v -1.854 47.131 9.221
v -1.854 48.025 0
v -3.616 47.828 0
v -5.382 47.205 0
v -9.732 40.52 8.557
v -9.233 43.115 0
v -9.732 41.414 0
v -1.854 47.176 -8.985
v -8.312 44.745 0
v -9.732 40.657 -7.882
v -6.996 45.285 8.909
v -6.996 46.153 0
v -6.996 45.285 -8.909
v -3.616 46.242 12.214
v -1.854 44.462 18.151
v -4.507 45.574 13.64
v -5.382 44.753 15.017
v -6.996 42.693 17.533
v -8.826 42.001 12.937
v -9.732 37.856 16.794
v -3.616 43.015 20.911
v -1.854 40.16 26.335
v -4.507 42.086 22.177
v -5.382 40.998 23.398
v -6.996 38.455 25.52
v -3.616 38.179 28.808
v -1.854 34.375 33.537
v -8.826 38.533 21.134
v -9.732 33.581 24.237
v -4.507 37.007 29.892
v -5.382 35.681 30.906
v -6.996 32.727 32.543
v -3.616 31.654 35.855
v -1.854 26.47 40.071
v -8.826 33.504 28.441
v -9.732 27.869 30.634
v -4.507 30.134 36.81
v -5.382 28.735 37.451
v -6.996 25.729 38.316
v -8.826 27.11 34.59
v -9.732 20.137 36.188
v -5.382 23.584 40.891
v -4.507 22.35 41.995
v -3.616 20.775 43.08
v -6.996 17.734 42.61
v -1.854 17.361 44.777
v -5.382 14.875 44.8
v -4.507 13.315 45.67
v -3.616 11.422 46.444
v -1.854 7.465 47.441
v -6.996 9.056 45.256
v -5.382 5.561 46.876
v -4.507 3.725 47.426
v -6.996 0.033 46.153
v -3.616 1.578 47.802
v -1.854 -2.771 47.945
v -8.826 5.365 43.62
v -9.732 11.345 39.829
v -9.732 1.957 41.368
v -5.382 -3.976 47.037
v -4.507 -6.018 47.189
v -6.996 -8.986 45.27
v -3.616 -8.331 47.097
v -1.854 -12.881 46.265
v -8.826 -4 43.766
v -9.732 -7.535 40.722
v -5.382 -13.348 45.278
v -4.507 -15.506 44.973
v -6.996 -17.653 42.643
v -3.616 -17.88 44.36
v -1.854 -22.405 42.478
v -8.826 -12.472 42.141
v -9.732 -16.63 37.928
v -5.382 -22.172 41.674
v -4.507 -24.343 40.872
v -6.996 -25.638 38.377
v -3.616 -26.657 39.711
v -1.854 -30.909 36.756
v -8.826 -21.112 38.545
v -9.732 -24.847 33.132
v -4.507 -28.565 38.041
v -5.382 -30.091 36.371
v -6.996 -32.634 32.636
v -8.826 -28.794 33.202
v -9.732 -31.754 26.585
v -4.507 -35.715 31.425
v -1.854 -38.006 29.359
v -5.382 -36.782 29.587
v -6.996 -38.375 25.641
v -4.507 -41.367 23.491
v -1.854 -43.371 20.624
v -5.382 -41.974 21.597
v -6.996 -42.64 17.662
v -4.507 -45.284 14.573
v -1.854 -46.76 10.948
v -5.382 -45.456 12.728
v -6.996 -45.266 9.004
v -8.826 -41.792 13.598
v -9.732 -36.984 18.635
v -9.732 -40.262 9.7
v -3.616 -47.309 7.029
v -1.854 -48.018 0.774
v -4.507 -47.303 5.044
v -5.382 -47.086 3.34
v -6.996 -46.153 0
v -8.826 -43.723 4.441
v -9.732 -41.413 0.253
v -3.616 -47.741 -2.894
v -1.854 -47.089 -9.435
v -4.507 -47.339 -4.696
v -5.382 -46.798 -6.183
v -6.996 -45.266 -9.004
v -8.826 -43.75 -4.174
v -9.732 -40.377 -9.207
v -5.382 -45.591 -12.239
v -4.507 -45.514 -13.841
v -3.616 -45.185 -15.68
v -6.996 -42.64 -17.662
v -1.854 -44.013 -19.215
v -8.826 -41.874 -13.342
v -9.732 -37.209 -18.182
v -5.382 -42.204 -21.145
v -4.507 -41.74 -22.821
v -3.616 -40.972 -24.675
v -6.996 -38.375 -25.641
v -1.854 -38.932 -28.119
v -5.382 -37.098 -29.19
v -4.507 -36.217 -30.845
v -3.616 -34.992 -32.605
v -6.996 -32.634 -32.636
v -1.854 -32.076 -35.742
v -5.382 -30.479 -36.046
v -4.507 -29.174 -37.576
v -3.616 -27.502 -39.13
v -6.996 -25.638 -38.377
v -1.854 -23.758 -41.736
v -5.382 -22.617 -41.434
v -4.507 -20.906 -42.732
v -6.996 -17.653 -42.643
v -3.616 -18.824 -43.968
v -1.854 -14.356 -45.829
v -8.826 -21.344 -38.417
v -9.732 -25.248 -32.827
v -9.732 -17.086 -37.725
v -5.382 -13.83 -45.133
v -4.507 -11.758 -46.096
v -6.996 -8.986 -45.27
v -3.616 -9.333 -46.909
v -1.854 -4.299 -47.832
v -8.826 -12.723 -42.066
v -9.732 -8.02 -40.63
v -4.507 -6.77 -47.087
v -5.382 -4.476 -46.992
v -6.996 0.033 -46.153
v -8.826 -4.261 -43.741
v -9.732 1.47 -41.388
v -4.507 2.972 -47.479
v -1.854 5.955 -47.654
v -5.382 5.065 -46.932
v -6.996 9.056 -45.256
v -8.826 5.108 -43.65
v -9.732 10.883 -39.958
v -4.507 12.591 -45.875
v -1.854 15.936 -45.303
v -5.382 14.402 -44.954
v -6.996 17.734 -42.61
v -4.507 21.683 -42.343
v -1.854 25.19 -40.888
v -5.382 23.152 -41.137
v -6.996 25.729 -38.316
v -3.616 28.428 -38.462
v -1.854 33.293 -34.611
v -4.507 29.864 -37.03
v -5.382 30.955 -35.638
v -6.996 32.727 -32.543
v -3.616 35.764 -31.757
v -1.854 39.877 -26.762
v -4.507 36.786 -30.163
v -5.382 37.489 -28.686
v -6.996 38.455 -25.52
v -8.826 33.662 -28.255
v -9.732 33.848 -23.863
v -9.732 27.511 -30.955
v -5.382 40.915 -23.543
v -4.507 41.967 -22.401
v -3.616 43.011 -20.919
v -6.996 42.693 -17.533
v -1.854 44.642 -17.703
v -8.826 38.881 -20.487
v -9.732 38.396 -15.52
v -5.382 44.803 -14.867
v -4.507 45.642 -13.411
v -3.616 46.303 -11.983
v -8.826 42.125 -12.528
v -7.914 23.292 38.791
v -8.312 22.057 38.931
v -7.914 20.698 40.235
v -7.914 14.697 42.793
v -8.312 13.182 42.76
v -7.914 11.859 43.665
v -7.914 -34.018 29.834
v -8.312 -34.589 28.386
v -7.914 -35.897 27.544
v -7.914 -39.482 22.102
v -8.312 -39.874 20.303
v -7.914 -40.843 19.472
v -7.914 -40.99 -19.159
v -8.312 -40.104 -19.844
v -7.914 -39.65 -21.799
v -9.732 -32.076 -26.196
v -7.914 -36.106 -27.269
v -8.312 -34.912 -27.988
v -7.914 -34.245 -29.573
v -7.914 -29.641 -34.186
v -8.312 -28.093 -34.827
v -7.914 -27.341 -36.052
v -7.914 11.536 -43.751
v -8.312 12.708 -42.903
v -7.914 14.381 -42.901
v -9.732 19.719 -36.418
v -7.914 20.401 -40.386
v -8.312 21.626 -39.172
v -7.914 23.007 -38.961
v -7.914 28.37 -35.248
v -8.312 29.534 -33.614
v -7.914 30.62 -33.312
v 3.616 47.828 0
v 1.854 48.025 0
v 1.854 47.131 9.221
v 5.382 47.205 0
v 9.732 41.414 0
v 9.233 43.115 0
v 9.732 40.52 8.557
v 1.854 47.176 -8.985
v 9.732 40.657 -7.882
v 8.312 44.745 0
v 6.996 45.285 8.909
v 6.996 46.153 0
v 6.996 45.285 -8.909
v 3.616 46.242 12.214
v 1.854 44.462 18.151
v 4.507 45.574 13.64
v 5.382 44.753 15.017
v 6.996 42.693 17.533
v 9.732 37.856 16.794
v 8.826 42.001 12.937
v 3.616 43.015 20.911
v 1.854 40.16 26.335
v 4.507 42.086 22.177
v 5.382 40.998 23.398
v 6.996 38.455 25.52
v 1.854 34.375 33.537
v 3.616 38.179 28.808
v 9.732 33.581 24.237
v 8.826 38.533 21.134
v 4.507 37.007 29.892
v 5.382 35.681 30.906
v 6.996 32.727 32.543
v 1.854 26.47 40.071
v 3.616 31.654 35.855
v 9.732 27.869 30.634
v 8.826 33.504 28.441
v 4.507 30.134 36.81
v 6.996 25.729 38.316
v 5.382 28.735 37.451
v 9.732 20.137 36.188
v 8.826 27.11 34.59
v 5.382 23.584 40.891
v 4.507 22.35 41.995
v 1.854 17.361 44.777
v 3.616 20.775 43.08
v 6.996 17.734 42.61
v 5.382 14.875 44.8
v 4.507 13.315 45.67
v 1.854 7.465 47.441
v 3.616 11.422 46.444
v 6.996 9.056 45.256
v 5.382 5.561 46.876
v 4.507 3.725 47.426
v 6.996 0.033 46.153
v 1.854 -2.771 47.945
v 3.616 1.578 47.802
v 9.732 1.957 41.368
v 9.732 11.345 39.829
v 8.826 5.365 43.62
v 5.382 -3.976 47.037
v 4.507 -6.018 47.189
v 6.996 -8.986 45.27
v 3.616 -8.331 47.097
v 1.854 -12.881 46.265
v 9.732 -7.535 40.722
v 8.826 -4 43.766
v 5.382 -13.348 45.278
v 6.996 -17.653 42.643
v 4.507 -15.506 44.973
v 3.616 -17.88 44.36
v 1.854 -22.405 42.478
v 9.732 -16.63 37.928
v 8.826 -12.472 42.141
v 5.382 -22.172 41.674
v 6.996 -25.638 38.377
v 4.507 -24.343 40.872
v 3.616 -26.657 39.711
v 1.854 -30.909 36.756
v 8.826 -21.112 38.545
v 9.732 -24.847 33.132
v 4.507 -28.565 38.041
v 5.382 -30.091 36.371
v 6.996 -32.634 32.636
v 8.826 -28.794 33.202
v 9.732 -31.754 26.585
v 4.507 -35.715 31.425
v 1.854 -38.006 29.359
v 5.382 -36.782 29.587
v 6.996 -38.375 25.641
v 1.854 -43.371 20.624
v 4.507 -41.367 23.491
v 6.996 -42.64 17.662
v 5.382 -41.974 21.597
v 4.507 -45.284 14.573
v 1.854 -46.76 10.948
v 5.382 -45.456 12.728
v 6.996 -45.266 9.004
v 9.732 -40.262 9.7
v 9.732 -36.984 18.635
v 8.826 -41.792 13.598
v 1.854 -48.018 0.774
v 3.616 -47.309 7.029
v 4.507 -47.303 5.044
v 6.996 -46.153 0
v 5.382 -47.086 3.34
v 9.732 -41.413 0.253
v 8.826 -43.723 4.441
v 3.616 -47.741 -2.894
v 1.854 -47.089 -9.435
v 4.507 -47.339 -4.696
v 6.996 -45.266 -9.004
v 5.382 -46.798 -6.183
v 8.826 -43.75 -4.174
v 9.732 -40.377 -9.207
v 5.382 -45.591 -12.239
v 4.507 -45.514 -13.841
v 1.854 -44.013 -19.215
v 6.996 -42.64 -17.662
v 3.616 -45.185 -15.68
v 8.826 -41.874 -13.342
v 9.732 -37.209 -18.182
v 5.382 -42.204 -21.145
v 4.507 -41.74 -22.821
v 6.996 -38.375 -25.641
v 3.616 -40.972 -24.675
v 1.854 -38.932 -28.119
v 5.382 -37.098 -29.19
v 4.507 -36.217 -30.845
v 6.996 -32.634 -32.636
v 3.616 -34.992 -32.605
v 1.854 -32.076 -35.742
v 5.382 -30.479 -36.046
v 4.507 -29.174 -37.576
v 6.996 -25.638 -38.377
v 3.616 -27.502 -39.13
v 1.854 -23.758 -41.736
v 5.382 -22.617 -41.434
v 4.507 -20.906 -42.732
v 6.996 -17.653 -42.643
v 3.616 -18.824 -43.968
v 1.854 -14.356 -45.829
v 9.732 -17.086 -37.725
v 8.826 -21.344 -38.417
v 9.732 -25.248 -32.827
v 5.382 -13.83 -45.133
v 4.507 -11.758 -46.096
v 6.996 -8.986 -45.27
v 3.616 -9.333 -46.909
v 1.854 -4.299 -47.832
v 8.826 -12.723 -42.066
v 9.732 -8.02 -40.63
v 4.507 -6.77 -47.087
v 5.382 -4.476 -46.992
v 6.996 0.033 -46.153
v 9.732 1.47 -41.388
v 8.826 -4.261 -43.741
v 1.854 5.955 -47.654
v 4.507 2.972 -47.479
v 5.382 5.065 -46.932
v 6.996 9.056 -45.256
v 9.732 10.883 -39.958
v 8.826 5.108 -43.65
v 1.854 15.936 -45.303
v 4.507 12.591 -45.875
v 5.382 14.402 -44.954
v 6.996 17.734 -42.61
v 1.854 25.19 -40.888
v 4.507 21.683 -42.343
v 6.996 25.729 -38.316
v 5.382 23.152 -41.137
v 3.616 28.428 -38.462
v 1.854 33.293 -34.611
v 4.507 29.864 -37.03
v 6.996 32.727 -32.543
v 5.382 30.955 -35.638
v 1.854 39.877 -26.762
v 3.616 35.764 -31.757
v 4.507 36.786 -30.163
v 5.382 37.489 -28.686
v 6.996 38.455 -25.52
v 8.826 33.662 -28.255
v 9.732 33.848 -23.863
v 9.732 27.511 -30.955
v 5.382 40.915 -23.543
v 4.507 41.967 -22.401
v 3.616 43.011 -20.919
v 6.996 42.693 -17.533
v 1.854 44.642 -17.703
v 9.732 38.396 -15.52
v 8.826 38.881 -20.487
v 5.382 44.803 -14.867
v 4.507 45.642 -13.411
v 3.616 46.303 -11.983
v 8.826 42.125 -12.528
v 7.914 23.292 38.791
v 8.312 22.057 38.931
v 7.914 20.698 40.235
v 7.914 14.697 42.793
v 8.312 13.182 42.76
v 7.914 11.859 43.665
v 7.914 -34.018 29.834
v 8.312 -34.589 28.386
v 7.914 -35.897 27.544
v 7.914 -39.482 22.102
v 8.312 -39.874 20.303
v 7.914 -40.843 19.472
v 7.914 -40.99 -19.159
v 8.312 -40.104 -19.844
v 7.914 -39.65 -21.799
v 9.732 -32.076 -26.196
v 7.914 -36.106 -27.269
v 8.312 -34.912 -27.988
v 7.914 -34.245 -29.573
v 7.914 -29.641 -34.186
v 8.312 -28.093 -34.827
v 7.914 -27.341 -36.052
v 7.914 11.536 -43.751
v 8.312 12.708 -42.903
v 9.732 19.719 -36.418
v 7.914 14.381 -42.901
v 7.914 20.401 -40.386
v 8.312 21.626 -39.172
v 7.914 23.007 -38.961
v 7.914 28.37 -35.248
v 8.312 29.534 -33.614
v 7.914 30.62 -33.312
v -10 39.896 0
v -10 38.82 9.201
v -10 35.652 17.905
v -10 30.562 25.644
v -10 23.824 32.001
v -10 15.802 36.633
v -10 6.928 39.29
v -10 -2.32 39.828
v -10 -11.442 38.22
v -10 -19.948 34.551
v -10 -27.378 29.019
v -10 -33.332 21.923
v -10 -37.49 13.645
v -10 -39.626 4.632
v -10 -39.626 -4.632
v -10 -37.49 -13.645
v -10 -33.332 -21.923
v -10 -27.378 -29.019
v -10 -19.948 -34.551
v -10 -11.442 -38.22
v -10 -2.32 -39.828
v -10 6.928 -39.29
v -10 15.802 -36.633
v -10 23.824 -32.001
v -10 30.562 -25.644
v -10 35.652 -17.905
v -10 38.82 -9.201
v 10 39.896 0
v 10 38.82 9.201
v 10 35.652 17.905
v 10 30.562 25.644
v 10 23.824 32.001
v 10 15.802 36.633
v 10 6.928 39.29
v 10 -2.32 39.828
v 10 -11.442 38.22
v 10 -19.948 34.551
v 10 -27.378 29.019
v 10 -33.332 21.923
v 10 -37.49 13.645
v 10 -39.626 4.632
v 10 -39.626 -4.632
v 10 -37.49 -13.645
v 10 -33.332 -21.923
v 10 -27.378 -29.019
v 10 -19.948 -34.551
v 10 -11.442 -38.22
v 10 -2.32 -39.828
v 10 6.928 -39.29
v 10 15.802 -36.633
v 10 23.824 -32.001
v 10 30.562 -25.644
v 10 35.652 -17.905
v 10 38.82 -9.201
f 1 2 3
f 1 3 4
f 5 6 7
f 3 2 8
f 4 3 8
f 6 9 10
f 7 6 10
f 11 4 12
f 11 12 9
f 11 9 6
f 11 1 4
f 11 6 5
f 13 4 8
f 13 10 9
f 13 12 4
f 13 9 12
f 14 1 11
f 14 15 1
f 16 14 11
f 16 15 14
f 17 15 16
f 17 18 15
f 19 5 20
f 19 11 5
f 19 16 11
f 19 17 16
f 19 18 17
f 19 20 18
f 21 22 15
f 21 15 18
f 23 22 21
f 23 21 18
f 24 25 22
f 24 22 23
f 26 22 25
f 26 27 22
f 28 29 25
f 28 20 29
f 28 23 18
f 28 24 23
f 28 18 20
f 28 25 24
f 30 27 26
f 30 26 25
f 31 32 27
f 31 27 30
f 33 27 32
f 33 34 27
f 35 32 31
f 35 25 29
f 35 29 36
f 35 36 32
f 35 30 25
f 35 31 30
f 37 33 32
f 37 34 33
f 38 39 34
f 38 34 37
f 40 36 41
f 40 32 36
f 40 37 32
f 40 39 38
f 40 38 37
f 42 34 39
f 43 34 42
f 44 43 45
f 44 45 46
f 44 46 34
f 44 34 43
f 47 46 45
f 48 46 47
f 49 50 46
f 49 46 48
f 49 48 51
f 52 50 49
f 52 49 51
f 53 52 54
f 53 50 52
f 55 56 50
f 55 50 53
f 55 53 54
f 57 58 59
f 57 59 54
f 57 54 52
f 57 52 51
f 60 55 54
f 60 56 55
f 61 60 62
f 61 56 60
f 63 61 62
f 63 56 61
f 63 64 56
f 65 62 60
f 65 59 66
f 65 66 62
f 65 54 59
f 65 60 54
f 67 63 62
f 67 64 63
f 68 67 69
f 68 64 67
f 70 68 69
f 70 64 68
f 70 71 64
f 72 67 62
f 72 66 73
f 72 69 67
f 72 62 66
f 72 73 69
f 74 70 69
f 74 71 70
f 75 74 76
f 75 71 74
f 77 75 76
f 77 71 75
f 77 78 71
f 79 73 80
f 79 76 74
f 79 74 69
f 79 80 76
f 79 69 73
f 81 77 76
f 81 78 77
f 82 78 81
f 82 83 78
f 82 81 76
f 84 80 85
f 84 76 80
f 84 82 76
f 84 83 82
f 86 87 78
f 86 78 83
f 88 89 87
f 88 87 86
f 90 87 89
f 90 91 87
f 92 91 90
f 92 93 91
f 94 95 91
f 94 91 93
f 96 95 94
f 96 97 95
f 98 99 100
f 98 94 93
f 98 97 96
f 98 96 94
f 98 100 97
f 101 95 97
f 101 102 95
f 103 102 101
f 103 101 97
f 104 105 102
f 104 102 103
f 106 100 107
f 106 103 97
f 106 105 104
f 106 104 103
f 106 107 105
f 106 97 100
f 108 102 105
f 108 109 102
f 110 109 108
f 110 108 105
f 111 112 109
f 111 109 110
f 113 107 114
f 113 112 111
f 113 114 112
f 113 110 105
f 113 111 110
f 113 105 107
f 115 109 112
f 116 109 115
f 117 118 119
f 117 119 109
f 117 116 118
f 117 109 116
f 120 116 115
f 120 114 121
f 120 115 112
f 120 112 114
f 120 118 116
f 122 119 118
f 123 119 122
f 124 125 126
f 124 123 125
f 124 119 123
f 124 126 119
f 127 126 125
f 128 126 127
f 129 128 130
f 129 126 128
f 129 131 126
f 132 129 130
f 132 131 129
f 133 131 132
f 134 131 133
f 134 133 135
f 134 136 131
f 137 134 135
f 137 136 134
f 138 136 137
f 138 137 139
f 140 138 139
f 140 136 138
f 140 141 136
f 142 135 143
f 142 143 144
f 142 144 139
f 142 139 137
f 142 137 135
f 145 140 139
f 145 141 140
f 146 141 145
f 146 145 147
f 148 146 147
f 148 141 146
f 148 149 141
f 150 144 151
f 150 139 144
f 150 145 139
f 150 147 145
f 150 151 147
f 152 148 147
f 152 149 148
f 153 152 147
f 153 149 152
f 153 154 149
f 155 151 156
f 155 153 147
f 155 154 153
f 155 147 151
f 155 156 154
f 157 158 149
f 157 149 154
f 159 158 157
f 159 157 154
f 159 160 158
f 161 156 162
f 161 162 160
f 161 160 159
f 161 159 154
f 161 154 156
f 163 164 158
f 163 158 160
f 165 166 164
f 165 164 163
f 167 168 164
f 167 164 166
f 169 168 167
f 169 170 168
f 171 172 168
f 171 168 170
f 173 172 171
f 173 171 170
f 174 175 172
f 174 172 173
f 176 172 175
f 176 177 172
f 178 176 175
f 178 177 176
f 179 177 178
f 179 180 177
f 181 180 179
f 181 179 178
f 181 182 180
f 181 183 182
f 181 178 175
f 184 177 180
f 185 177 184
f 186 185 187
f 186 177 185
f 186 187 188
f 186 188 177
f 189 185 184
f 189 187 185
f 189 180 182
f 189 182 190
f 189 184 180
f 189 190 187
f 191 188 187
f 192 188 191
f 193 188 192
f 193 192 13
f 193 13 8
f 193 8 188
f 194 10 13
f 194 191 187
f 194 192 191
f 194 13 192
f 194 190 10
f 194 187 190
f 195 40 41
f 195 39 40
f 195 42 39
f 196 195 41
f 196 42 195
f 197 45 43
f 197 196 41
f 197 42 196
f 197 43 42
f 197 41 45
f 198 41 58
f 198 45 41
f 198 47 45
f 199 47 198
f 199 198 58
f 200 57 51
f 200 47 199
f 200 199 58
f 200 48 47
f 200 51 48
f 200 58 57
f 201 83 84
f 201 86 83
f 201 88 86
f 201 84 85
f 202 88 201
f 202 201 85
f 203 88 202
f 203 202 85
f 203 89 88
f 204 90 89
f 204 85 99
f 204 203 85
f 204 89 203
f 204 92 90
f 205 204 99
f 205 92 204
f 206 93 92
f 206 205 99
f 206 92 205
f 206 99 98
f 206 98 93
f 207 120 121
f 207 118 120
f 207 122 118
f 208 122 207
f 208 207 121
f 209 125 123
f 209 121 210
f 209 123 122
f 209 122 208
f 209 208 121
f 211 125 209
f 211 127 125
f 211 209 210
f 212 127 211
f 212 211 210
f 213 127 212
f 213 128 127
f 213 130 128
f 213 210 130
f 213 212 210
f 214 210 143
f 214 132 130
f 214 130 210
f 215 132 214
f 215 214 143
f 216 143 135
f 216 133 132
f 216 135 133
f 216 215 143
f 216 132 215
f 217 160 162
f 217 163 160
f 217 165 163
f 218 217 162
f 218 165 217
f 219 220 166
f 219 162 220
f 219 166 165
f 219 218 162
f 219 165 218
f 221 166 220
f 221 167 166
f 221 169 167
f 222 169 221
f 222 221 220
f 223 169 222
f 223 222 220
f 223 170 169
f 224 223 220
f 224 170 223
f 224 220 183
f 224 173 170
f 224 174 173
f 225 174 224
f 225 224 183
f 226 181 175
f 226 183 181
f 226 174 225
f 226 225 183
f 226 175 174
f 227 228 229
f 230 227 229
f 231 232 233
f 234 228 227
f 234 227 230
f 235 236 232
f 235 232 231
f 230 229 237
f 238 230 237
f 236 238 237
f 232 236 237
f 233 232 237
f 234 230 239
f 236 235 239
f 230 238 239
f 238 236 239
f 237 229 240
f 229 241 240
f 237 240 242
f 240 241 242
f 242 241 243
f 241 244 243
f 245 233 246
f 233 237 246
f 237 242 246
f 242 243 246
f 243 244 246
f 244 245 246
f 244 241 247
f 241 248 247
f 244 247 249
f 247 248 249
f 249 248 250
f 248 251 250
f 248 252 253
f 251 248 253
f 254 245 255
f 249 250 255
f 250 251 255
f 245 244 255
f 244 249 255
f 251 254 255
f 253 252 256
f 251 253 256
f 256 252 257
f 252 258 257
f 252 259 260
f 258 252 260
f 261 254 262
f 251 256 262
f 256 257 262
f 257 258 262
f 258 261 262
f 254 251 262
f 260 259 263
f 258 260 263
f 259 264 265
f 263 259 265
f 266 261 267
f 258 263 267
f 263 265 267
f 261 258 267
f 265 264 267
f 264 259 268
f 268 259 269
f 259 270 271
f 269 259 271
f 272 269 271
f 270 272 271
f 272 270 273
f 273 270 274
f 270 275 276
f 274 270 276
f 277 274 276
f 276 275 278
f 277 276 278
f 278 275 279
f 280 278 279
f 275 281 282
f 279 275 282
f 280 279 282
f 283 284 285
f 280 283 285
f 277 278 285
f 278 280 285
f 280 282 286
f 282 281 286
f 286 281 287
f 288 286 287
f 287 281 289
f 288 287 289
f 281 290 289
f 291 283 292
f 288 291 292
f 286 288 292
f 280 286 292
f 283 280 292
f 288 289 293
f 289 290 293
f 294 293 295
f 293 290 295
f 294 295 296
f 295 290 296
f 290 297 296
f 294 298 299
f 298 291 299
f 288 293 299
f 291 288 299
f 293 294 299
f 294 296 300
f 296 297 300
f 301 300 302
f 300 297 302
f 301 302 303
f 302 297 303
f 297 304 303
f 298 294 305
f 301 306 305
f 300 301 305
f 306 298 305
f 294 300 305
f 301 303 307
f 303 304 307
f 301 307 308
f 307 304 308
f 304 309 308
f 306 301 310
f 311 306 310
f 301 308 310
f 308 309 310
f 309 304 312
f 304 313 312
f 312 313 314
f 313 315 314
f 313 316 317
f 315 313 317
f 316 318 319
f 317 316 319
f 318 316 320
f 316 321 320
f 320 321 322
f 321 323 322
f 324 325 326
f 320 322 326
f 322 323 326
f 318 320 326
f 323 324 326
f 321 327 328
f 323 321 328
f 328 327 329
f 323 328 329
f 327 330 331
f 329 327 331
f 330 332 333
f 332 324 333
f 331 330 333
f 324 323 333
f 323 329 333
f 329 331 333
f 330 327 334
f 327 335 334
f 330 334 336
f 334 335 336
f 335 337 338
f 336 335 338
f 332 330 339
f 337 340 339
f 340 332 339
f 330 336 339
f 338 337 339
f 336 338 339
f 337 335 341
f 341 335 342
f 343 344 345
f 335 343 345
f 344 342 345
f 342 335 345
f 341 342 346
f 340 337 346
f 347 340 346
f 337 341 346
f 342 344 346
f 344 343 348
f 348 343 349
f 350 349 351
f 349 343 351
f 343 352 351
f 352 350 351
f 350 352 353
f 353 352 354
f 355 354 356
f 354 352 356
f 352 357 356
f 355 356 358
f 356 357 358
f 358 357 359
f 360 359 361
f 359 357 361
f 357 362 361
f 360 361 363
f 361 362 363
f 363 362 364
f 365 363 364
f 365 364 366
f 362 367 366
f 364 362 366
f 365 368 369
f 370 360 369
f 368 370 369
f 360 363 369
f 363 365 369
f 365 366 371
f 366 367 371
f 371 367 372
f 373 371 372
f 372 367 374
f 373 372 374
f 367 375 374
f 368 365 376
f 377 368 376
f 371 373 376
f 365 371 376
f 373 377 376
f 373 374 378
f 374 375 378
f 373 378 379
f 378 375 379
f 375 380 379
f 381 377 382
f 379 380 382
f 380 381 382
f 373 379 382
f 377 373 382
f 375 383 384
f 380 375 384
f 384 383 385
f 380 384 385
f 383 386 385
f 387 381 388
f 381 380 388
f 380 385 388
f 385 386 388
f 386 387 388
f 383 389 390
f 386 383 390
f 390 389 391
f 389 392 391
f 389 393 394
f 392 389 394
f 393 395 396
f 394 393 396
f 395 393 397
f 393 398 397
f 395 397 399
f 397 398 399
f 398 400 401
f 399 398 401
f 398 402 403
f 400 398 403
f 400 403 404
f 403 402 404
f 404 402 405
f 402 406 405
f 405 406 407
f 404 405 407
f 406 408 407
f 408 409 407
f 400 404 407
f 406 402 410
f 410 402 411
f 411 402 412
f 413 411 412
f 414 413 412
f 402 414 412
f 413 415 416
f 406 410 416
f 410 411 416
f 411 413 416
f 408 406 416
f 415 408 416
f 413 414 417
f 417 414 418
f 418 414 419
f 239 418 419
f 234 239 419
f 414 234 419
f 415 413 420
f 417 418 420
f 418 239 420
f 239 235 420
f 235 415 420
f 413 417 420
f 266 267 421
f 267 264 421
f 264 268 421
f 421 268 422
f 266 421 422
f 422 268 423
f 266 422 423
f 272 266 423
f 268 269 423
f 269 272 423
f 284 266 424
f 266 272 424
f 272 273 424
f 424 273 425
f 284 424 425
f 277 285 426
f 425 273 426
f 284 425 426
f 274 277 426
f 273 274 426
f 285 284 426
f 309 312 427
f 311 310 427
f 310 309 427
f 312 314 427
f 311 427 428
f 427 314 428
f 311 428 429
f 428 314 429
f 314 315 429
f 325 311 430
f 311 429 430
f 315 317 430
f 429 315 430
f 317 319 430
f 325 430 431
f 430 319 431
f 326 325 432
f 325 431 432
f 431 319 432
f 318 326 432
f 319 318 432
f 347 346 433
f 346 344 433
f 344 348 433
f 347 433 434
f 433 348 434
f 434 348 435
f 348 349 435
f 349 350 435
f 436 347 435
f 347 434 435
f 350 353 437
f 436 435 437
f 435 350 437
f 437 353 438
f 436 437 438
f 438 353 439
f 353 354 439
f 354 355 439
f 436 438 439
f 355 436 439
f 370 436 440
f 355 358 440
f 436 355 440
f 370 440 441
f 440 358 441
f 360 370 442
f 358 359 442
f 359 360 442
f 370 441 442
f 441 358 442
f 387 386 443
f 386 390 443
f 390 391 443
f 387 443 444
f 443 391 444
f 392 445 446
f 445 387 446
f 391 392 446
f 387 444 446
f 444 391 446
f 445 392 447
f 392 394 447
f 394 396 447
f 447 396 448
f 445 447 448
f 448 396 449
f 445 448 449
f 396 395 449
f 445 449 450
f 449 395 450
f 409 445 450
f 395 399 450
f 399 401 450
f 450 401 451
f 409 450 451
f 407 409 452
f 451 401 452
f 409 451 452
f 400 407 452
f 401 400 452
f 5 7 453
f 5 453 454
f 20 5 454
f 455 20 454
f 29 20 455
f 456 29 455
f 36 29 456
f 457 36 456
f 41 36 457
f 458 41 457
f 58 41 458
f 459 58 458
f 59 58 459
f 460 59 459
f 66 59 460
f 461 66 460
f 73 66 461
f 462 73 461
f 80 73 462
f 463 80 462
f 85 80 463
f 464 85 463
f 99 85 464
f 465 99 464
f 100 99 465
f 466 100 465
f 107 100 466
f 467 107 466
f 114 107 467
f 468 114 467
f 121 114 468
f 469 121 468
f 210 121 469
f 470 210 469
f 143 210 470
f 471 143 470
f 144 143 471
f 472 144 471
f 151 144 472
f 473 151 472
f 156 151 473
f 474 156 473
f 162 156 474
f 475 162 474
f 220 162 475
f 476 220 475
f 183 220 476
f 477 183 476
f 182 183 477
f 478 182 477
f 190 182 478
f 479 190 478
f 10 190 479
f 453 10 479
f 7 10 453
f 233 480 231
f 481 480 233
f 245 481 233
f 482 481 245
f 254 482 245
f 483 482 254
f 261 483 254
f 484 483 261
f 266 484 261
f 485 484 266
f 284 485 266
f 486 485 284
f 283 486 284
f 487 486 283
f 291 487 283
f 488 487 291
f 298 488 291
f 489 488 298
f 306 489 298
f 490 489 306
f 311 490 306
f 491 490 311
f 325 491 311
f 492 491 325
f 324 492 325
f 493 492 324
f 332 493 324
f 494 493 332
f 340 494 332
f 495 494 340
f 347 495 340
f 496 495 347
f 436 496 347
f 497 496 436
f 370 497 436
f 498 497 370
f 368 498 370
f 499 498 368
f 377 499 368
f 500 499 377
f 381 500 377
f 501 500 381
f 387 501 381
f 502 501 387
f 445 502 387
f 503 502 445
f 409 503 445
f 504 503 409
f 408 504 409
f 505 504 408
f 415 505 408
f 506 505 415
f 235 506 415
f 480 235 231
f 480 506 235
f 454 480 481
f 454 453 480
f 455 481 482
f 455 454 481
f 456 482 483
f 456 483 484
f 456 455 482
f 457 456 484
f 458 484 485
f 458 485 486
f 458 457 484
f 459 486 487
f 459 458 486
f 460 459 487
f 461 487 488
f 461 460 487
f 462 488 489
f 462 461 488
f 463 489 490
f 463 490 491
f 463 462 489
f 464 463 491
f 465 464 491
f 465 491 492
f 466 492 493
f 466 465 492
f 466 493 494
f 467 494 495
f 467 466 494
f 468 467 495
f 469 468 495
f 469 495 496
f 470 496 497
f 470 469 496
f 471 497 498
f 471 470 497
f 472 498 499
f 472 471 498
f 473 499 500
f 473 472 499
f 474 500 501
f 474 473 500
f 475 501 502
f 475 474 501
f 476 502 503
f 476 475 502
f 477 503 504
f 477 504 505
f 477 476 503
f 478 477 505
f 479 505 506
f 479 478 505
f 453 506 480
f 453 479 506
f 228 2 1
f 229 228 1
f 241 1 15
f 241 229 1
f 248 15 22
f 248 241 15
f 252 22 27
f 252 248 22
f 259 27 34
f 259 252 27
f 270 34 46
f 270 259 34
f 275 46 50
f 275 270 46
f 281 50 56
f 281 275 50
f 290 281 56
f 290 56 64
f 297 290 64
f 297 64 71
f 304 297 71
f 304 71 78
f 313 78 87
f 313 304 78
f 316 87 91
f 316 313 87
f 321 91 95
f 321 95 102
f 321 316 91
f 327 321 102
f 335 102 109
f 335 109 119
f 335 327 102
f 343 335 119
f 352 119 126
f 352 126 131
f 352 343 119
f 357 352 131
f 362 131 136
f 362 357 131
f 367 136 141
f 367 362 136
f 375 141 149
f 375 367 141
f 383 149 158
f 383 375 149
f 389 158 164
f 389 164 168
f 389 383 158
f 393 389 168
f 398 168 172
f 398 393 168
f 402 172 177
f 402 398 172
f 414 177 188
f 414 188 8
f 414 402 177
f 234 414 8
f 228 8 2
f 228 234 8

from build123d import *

# Parameters (mm, degrees)
FILLET1_R = 8
FILLET2_R = 8


with BuildPart() as part:
    # Sketch1 → Revolve8 (revolve)
    with BuildSketch(Plane.XY):
        Polygon((-8.566656945, 48.024560211), (8.566656945, 48.024560211), (10, 39.895667803), (-10, 39.895667803), align=None)
    revolve(axis=Axis((0, 0, 0), (1, 0, 0)))

    # Fillet1
    fillet1_edges = [part.edges().sort_by_distance(p)[0] for p in [
        (-8.566656945, -48.024560211, 0),
    ]]
    fillet(fillet1_edges, radius=FILLET1_R)

    # Fillet2
    fillet2_edges = [part.edges().sort_by_distance(p)[0] for p in [
        (8.566656945, -48.024560211, 0),
    ]]
    fillet(fillet2_edges, radius=FILLET2_R)


solid = part.part
